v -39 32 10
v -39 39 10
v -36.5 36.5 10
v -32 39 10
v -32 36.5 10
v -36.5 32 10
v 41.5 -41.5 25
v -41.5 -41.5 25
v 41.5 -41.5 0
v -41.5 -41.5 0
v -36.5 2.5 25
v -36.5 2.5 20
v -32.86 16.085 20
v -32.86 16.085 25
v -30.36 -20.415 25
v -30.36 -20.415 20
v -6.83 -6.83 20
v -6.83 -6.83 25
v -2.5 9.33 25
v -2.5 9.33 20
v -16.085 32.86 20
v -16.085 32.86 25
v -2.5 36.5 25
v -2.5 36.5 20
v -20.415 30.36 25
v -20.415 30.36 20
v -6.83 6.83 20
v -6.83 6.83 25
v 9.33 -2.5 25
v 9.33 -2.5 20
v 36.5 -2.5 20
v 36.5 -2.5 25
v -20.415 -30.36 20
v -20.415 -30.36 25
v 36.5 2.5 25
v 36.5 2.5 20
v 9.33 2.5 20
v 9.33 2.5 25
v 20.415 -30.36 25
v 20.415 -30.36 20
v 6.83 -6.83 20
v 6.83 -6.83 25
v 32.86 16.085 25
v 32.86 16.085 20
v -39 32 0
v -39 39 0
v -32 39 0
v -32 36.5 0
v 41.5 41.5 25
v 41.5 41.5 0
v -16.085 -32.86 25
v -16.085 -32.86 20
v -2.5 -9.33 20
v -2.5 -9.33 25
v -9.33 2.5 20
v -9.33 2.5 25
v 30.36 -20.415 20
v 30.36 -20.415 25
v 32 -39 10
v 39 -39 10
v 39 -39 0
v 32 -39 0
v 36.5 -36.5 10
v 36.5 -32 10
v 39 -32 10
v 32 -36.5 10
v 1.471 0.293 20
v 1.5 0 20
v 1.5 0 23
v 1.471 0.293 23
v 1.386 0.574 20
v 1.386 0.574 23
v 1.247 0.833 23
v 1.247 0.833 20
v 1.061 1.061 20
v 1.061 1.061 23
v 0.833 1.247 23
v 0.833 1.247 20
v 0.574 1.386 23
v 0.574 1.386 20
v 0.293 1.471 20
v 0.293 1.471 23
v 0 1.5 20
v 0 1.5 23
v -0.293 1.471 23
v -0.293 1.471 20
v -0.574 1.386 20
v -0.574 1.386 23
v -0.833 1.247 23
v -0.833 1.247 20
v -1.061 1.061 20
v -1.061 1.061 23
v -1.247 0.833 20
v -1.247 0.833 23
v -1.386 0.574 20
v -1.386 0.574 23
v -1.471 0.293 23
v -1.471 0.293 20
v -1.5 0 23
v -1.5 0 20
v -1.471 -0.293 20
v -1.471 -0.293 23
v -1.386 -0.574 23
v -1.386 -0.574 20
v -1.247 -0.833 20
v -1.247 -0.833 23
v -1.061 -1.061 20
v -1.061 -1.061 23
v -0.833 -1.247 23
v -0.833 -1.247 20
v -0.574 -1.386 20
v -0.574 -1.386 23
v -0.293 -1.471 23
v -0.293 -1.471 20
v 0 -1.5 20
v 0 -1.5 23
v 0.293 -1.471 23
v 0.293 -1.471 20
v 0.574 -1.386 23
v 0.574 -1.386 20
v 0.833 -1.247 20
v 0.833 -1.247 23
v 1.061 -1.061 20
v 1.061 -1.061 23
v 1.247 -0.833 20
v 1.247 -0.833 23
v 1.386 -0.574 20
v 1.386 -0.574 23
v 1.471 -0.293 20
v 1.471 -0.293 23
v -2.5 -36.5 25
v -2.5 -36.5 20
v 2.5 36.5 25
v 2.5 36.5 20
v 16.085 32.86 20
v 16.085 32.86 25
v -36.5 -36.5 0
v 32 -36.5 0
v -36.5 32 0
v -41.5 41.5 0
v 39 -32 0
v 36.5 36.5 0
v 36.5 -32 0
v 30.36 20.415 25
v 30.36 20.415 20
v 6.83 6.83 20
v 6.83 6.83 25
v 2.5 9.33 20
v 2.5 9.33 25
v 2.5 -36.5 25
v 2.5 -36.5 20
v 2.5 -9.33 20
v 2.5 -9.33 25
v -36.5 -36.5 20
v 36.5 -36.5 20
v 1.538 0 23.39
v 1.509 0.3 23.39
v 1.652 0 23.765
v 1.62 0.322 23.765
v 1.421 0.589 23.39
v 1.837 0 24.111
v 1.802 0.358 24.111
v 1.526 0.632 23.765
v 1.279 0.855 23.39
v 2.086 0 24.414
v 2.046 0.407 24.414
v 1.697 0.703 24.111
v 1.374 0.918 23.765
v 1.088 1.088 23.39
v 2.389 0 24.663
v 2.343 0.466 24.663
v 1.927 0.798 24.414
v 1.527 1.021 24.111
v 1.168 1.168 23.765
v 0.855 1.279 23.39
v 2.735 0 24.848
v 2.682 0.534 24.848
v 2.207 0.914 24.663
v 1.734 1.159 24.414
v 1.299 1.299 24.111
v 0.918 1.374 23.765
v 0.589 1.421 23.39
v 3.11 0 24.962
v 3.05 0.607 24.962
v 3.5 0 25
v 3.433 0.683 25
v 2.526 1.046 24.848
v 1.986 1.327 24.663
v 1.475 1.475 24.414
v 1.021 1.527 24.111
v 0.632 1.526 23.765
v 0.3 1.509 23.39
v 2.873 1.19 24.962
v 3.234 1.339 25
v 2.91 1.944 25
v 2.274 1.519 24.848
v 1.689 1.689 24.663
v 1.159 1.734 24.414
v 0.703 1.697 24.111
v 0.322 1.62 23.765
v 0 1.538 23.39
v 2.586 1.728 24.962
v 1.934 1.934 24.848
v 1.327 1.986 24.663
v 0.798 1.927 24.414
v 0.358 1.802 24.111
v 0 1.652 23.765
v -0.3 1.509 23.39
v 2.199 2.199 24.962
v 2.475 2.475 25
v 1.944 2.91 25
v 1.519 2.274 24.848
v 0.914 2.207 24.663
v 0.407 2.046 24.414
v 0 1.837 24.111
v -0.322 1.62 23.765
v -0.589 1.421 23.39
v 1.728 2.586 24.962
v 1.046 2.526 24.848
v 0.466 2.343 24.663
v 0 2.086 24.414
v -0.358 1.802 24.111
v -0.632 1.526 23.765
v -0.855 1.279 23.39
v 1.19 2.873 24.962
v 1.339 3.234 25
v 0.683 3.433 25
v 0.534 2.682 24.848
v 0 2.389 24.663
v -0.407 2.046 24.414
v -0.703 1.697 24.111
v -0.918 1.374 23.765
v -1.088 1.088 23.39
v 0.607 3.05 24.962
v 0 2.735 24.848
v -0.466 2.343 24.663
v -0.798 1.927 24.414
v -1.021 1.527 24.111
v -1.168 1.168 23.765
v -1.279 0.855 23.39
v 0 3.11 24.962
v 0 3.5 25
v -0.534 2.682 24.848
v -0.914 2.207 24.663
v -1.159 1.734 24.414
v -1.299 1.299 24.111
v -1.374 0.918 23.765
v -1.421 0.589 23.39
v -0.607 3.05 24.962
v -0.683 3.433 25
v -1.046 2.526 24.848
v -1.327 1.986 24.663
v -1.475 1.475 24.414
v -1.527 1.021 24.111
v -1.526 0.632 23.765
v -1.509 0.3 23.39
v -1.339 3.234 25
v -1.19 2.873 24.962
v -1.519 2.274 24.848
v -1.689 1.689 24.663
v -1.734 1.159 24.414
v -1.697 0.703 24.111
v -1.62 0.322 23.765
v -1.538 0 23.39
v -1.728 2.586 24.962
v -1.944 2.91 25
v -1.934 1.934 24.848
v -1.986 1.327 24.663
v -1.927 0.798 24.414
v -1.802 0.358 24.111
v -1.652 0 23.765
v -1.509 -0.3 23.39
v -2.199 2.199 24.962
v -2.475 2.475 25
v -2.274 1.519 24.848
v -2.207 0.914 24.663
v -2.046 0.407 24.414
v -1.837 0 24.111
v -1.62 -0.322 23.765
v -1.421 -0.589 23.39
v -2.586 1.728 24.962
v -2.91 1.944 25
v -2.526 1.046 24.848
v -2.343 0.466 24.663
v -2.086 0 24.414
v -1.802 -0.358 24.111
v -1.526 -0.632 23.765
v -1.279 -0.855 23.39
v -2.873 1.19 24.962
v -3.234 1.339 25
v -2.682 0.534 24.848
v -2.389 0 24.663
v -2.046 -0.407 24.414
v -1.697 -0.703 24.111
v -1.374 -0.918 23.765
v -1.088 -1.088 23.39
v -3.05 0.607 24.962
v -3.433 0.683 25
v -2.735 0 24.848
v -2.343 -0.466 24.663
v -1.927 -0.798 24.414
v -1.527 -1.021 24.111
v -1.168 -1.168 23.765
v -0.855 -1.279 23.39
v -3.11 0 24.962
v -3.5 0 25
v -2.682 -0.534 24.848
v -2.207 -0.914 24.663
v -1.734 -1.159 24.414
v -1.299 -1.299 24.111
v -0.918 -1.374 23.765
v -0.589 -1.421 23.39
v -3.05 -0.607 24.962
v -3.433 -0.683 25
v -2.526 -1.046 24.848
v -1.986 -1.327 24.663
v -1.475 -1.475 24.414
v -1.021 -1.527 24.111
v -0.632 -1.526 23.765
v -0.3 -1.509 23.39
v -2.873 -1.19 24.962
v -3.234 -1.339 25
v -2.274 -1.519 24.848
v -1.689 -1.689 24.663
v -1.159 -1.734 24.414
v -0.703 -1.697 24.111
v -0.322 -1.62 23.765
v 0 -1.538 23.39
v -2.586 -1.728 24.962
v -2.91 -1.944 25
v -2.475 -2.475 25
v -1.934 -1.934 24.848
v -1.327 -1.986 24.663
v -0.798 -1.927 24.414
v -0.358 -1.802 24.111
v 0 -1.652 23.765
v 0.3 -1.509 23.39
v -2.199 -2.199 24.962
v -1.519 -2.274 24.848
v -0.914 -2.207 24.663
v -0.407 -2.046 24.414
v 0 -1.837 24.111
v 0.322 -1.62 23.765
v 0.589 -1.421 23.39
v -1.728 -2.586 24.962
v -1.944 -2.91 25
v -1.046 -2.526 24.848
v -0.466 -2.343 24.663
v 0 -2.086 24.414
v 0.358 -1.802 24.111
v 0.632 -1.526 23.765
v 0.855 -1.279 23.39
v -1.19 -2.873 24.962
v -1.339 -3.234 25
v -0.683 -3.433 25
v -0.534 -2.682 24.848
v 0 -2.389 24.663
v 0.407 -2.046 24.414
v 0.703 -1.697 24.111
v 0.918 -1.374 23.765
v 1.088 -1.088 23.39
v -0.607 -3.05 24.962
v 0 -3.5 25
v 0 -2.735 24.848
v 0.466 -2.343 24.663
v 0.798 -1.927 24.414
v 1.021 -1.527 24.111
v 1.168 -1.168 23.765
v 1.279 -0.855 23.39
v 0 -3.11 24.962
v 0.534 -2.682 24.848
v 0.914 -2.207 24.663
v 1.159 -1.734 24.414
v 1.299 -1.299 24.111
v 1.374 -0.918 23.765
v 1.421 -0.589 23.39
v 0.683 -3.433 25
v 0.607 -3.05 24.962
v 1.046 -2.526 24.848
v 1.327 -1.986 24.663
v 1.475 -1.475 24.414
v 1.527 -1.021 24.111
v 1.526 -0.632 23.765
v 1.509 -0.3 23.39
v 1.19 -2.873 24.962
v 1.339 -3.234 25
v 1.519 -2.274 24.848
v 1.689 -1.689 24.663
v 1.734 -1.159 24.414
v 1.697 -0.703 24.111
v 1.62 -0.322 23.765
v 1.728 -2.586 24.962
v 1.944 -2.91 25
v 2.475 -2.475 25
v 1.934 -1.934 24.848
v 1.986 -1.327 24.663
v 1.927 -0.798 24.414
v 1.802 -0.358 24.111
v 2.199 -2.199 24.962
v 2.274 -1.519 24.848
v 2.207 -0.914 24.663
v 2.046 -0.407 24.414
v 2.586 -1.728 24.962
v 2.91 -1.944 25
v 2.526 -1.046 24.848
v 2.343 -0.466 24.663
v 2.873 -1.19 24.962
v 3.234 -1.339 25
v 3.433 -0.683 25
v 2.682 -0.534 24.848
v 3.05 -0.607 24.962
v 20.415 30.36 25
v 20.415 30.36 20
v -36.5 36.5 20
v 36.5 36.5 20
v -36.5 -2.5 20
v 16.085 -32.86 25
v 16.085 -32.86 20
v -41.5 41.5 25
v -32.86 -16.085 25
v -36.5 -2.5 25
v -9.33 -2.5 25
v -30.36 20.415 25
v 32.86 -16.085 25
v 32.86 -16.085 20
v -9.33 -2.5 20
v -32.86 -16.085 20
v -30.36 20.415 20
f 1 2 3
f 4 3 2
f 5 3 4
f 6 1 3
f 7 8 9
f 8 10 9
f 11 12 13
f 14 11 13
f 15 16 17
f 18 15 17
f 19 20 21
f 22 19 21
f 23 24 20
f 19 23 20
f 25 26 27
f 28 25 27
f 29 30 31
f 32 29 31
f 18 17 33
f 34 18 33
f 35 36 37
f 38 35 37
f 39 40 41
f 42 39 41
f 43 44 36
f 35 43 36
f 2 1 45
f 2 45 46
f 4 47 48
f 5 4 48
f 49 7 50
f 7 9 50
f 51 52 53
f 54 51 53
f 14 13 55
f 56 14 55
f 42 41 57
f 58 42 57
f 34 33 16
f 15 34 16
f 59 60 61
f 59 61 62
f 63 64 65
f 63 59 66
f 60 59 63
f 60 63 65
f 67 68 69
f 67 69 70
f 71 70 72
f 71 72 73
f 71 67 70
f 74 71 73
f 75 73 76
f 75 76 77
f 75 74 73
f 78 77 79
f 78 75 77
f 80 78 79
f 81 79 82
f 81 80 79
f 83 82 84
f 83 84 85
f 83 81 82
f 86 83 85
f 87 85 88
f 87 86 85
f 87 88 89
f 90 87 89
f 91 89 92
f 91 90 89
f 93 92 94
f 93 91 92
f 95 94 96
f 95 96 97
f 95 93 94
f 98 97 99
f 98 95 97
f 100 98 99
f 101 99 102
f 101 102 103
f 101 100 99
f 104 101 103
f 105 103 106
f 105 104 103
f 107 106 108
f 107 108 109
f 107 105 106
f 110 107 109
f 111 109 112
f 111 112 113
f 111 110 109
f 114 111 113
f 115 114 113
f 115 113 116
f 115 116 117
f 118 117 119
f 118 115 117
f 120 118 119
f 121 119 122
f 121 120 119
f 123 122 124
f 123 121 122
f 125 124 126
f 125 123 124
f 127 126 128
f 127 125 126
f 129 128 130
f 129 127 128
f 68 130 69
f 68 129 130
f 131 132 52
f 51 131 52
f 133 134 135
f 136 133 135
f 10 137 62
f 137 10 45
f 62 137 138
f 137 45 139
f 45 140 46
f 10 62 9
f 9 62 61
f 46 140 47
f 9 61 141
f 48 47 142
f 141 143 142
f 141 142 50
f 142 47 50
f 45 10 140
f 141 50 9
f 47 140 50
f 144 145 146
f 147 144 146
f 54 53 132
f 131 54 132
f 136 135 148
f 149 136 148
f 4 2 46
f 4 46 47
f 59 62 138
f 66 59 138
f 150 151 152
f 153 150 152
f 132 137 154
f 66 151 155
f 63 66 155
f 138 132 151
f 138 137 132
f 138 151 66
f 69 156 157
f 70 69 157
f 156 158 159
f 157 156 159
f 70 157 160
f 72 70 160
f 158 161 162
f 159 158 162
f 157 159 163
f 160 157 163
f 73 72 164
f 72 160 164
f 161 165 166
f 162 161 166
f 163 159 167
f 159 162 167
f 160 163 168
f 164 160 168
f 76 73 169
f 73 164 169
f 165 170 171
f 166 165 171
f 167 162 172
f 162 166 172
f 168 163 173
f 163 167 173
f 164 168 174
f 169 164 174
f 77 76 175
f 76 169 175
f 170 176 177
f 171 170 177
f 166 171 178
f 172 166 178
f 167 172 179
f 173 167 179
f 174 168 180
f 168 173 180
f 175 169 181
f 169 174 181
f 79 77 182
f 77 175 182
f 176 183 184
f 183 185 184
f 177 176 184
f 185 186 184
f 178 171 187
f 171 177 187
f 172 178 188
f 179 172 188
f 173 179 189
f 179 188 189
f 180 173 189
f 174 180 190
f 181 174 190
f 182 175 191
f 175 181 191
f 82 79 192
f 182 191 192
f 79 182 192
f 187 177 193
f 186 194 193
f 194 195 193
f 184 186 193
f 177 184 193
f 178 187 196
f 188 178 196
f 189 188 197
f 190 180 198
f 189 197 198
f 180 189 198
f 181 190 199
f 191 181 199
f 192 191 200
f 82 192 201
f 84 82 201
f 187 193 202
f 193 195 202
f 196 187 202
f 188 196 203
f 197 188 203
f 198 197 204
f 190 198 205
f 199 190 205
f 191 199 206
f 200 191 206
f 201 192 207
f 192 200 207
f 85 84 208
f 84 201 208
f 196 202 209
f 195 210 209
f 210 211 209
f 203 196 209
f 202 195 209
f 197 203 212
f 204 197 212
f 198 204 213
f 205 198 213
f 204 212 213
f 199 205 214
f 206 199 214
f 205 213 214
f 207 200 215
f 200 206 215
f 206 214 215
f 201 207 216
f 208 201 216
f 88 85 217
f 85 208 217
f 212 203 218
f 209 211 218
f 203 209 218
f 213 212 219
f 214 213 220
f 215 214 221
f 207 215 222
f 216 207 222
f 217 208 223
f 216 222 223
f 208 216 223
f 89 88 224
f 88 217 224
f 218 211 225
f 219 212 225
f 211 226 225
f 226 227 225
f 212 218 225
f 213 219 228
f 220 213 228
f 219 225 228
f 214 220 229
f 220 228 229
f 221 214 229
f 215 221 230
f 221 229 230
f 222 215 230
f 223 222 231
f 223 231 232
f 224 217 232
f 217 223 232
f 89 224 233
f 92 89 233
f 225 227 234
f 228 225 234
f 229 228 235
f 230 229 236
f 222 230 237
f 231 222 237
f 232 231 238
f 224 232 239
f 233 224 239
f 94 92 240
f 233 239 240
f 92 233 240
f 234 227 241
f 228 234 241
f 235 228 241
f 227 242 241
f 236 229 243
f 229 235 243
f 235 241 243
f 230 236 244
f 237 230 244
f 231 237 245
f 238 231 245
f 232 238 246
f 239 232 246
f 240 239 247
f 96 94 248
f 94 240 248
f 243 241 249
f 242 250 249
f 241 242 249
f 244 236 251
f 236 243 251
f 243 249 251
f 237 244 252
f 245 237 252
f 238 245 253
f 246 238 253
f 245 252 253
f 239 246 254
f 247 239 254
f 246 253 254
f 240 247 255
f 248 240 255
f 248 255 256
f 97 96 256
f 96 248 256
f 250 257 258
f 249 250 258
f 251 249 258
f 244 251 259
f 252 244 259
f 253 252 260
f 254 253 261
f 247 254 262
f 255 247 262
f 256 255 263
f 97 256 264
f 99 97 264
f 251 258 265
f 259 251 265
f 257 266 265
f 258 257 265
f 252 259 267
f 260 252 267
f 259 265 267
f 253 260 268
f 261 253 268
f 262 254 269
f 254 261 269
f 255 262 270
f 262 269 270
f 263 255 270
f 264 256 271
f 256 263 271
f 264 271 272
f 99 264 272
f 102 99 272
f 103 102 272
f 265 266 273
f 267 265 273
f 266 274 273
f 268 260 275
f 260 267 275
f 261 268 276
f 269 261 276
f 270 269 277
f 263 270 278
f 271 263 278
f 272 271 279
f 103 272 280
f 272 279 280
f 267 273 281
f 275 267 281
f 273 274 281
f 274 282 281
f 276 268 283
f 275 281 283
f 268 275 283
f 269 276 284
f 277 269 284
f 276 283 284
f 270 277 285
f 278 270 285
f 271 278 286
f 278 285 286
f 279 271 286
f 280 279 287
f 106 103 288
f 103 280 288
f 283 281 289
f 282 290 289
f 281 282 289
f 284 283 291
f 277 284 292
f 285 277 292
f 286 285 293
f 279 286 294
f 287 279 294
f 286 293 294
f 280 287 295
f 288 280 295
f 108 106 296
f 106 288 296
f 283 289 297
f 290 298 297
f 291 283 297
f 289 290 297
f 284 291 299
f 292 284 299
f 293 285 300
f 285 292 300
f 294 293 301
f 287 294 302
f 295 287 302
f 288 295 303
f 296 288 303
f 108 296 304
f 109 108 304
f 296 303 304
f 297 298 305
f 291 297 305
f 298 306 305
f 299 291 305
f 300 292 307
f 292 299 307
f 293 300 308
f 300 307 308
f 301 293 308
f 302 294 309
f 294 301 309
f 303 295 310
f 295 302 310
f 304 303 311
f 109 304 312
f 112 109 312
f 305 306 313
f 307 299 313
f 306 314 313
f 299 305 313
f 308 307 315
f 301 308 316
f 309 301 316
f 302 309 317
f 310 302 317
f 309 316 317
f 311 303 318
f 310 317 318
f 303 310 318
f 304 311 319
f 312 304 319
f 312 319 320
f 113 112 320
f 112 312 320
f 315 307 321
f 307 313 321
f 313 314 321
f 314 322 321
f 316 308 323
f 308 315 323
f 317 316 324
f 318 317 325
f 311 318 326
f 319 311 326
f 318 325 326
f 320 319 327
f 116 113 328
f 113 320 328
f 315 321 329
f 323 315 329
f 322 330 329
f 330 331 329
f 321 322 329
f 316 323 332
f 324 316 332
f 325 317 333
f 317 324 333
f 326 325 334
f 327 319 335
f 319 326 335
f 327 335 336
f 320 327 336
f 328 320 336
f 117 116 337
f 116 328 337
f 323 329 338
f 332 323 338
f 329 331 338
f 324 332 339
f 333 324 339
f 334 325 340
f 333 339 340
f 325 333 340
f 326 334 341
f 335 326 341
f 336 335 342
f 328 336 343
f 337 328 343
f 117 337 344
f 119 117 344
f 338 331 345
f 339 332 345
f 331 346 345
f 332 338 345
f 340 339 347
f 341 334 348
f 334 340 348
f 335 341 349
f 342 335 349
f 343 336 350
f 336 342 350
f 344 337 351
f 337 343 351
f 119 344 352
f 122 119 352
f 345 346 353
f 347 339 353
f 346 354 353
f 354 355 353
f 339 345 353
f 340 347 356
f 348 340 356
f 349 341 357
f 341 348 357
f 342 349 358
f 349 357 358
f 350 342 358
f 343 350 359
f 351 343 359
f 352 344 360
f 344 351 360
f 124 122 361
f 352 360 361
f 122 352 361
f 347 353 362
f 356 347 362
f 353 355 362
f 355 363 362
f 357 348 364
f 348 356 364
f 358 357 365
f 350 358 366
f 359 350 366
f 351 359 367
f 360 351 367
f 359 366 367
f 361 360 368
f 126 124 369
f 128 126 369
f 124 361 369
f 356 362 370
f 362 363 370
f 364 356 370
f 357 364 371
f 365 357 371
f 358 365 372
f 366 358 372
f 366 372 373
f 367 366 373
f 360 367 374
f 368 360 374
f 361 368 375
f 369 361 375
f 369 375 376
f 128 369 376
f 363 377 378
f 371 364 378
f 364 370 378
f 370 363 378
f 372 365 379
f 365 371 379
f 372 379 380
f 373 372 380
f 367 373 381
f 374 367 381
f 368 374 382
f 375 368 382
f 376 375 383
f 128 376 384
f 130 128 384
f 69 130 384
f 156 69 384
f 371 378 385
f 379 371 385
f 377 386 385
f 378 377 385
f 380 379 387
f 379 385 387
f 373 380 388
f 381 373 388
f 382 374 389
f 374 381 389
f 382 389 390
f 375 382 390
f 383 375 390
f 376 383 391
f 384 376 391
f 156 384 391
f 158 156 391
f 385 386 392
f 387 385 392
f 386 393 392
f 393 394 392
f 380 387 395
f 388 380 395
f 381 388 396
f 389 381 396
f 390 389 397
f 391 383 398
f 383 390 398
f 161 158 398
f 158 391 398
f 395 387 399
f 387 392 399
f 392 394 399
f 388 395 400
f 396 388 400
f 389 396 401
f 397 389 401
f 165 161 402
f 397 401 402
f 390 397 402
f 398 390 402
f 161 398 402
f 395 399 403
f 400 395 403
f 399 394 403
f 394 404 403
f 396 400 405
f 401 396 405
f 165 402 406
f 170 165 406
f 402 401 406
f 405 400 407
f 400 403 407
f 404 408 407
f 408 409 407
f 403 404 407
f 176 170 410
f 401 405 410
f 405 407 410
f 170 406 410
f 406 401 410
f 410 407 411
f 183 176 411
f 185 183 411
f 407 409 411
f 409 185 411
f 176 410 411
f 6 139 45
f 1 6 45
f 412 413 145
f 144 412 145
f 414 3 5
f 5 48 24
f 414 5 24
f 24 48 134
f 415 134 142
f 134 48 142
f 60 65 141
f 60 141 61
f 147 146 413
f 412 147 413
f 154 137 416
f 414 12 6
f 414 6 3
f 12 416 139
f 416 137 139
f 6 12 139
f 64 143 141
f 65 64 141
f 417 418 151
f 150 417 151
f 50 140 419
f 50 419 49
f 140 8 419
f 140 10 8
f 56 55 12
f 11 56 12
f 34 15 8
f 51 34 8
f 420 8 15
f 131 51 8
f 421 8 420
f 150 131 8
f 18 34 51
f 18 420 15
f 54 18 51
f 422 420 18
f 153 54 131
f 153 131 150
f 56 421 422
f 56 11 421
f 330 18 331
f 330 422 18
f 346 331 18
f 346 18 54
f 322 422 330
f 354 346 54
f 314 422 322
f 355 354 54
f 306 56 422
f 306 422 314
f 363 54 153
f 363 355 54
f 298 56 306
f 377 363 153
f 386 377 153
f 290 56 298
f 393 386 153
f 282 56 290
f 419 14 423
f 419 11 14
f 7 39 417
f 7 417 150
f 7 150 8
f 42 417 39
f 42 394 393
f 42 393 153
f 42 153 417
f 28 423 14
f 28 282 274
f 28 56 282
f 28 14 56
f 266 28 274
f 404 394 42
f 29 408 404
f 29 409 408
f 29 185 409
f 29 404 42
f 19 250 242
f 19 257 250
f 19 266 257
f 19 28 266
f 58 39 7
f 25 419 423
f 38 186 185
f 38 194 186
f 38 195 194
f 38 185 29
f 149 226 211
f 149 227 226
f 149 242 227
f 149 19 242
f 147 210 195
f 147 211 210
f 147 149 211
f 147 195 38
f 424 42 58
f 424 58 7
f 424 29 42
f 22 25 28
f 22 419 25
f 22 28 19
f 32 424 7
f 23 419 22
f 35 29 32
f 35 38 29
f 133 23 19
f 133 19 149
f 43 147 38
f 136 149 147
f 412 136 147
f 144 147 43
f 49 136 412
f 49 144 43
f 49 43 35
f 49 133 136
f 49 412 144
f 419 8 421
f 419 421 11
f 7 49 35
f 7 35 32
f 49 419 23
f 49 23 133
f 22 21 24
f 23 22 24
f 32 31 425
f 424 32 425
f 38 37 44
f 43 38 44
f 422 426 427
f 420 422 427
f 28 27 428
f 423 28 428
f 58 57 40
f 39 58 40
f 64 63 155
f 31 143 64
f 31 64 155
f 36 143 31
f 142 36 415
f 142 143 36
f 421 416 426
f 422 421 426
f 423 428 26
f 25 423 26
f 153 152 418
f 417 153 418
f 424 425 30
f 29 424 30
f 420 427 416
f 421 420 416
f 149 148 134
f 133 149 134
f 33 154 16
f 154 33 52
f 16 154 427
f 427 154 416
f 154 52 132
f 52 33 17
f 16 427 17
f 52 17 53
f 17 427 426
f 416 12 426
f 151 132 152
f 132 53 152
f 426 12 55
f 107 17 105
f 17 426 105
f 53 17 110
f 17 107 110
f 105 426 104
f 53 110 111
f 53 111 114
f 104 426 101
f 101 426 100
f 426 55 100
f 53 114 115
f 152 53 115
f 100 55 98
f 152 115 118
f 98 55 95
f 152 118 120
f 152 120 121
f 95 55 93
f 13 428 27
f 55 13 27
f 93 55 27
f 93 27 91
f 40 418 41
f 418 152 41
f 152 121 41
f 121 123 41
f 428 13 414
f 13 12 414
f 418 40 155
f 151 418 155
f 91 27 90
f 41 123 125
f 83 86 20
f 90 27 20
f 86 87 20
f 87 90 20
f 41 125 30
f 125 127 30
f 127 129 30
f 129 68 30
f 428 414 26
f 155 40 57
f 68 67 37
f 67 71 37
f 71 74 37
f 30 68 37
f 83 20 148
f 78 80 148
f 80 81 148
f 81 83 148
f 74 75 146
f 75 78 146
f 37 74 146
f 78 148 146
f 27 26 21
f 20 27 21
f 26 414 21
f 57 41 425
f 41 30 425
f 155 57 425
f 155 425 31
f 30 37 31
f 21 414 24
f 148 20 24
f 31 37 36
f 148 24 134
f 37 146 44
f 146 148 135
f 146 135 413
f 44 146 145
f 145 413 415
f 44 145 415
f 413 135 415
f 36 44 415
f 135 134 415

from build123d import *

# Parameters (mm, degrees)
F0_W     = 83
F0_H     = 83
F0_W_2   = 73
F0_H_2   = 73
F1_DEPTH = 20
F4_DEPTH = 10
F5_W     = 83
F5_H     = 83
F5_R     = 1.5
F6_DEPTH = 5
F7_R     = 2


with BuildPart() as f1:
    # F0 (on Top) → F1 (new body)
    with BuildSketch(Plane.XY):
        Rectangle(F0_W, F0_H)
        Rectangle(F0_W_2, F0_H_2, mode=Mode.SUBTRACT)
    extrude(amount=F1_DEPTH)

    # F2: F1 across plane


with BuildPart() as f1_1:
    add(f1.part)
    add(f1.part.mirror(Plane.YZ))

    # F3 (on face) → F4 (cut)
    with BuildSketch(Plane(origin=(0, 0, 0), x_dir=(1, 0, 0), z_dir=(0, 0, -1))):
        Polygon((36.5, 32), (39, 32), (39, 39), (32, 39), (32, 36.5), (36.5, 36.5), align=None)
        Polygon((-39, -32), (-39, -39), (-32, -39), (-32, -36.5), (-36.5, -36.5), (-36.5, -32), align=None)
    extrude(amount=-F4_DEPTH, mode=Mode.SUBTRACT)

    # F5 (on face) → F6 (join)
    with BuildSketch(Plane.XY.offset(20)):
        Rectangle(F5_W, F5_H)
        Polygon((36.5, 2.5), (36.5, -2.5), (36.5, -36.5), (2.5, -36.5), (-2.5, -36.5), (-36.5, -36.5), (-36.5, -2.5), (-36.5, 2.5), (-36.5, 36.5), (-2.5, 36.5), (2.5, 36.5), (36.5, 36.5), align=None, mode=Mode.SUBTRACT)
        Polygon((36.5, -36.5), (36.5, -2.5), (36.5, 2.5), (36.5, 36.5), (2.5, 36.5), (-2.5, 36.5), (-36.5, 36.5), (-36.5, 2.5), (-36.5, -2.5), (-36.5, -36.5), (-2.5, -36.5), (2.5, -36.5), align=None)
        Polygon((-2.5, -9.3301270189), (-2.5, -36.5), (-16.0849364905, -32.8599272381), align=None, mode=Mode.SUBTRACT)
        Polygon((-32.8599272381, -16.0849364905), (-36.5, -2.5), (-9.3301270189, -2.5), align=None, mode=Mode.SUBTRACT)
        Polygon((-6.8301270189, -6.8301270189), (-20.4150635095, -30.3599272381), (-30.3599272381, -20.4150635095), align=None, mode=Mode.SUBTRACT)
        Polygon((16.0849364905, -32.8599272381), (2.5, -36.5), (2.5, -9.3301270189), align=None, mode=Mode.SUBTRACT)
        Polygon((6.8301270189, -6.8301270189), (30.3599272381, -20.4150635095), (20.4150635095, -30.3599272381), align=None, mode=Mode.SUBTRACT)
        Polygon((9.3301270189, -2.5), (36.5, -2.5), (32.8599272381, -16.0849364905), align=None, mode=Mode.SUBTRACT)
        Polygon((-9.3301270189, 2.5), (-36.5, 2.5), (-32.8599272381, 16.0849364905), align=None, mode=Mode.SUBTRACT)
        Polygon((-30.3599272381, 20.4150635095), (-20.4150635095, 30.3599272381), (-6.8301270189, 6.8301270189), align=None, mode=Mode.SUBTRACT)
        Polygon((-16.0849364905, 32.8599272381), (-2.5, 36.5), (-2.5, 9.3301270189), align=None, mode=Mode.SUBTRACT)
        Circle(F5_R, mode=Mode.SUBTRACT)
        Polygon((20.4150635095, 30.3599272381), (30.3599272381, 20.4150635095), (6.8301270189, 6.8301270189), align=None, mode=Mode.SUBTRACT)
        Polygon((32.8599272381, 16.0849364905), (36.5, 2.5), (9.3301270189, 2.5), align=None, mode=Mode.SUBTRACT)
        Polygon((2.5, 9.3301270189), (2.5, 36.5), (16.0849364905, 32.8599272381), align=None, mode=Mode.SUBTRACT)
    extrude(amount=F6_DEPTH)

    # F7
    f7_edges = [f1_1.edges().sort_by_distance(p)[0] for p in [
        (-1.5, 0, 25),
    ]]
    fillet(f7_edges, radius=F7_R)


solid = f1_1.part
